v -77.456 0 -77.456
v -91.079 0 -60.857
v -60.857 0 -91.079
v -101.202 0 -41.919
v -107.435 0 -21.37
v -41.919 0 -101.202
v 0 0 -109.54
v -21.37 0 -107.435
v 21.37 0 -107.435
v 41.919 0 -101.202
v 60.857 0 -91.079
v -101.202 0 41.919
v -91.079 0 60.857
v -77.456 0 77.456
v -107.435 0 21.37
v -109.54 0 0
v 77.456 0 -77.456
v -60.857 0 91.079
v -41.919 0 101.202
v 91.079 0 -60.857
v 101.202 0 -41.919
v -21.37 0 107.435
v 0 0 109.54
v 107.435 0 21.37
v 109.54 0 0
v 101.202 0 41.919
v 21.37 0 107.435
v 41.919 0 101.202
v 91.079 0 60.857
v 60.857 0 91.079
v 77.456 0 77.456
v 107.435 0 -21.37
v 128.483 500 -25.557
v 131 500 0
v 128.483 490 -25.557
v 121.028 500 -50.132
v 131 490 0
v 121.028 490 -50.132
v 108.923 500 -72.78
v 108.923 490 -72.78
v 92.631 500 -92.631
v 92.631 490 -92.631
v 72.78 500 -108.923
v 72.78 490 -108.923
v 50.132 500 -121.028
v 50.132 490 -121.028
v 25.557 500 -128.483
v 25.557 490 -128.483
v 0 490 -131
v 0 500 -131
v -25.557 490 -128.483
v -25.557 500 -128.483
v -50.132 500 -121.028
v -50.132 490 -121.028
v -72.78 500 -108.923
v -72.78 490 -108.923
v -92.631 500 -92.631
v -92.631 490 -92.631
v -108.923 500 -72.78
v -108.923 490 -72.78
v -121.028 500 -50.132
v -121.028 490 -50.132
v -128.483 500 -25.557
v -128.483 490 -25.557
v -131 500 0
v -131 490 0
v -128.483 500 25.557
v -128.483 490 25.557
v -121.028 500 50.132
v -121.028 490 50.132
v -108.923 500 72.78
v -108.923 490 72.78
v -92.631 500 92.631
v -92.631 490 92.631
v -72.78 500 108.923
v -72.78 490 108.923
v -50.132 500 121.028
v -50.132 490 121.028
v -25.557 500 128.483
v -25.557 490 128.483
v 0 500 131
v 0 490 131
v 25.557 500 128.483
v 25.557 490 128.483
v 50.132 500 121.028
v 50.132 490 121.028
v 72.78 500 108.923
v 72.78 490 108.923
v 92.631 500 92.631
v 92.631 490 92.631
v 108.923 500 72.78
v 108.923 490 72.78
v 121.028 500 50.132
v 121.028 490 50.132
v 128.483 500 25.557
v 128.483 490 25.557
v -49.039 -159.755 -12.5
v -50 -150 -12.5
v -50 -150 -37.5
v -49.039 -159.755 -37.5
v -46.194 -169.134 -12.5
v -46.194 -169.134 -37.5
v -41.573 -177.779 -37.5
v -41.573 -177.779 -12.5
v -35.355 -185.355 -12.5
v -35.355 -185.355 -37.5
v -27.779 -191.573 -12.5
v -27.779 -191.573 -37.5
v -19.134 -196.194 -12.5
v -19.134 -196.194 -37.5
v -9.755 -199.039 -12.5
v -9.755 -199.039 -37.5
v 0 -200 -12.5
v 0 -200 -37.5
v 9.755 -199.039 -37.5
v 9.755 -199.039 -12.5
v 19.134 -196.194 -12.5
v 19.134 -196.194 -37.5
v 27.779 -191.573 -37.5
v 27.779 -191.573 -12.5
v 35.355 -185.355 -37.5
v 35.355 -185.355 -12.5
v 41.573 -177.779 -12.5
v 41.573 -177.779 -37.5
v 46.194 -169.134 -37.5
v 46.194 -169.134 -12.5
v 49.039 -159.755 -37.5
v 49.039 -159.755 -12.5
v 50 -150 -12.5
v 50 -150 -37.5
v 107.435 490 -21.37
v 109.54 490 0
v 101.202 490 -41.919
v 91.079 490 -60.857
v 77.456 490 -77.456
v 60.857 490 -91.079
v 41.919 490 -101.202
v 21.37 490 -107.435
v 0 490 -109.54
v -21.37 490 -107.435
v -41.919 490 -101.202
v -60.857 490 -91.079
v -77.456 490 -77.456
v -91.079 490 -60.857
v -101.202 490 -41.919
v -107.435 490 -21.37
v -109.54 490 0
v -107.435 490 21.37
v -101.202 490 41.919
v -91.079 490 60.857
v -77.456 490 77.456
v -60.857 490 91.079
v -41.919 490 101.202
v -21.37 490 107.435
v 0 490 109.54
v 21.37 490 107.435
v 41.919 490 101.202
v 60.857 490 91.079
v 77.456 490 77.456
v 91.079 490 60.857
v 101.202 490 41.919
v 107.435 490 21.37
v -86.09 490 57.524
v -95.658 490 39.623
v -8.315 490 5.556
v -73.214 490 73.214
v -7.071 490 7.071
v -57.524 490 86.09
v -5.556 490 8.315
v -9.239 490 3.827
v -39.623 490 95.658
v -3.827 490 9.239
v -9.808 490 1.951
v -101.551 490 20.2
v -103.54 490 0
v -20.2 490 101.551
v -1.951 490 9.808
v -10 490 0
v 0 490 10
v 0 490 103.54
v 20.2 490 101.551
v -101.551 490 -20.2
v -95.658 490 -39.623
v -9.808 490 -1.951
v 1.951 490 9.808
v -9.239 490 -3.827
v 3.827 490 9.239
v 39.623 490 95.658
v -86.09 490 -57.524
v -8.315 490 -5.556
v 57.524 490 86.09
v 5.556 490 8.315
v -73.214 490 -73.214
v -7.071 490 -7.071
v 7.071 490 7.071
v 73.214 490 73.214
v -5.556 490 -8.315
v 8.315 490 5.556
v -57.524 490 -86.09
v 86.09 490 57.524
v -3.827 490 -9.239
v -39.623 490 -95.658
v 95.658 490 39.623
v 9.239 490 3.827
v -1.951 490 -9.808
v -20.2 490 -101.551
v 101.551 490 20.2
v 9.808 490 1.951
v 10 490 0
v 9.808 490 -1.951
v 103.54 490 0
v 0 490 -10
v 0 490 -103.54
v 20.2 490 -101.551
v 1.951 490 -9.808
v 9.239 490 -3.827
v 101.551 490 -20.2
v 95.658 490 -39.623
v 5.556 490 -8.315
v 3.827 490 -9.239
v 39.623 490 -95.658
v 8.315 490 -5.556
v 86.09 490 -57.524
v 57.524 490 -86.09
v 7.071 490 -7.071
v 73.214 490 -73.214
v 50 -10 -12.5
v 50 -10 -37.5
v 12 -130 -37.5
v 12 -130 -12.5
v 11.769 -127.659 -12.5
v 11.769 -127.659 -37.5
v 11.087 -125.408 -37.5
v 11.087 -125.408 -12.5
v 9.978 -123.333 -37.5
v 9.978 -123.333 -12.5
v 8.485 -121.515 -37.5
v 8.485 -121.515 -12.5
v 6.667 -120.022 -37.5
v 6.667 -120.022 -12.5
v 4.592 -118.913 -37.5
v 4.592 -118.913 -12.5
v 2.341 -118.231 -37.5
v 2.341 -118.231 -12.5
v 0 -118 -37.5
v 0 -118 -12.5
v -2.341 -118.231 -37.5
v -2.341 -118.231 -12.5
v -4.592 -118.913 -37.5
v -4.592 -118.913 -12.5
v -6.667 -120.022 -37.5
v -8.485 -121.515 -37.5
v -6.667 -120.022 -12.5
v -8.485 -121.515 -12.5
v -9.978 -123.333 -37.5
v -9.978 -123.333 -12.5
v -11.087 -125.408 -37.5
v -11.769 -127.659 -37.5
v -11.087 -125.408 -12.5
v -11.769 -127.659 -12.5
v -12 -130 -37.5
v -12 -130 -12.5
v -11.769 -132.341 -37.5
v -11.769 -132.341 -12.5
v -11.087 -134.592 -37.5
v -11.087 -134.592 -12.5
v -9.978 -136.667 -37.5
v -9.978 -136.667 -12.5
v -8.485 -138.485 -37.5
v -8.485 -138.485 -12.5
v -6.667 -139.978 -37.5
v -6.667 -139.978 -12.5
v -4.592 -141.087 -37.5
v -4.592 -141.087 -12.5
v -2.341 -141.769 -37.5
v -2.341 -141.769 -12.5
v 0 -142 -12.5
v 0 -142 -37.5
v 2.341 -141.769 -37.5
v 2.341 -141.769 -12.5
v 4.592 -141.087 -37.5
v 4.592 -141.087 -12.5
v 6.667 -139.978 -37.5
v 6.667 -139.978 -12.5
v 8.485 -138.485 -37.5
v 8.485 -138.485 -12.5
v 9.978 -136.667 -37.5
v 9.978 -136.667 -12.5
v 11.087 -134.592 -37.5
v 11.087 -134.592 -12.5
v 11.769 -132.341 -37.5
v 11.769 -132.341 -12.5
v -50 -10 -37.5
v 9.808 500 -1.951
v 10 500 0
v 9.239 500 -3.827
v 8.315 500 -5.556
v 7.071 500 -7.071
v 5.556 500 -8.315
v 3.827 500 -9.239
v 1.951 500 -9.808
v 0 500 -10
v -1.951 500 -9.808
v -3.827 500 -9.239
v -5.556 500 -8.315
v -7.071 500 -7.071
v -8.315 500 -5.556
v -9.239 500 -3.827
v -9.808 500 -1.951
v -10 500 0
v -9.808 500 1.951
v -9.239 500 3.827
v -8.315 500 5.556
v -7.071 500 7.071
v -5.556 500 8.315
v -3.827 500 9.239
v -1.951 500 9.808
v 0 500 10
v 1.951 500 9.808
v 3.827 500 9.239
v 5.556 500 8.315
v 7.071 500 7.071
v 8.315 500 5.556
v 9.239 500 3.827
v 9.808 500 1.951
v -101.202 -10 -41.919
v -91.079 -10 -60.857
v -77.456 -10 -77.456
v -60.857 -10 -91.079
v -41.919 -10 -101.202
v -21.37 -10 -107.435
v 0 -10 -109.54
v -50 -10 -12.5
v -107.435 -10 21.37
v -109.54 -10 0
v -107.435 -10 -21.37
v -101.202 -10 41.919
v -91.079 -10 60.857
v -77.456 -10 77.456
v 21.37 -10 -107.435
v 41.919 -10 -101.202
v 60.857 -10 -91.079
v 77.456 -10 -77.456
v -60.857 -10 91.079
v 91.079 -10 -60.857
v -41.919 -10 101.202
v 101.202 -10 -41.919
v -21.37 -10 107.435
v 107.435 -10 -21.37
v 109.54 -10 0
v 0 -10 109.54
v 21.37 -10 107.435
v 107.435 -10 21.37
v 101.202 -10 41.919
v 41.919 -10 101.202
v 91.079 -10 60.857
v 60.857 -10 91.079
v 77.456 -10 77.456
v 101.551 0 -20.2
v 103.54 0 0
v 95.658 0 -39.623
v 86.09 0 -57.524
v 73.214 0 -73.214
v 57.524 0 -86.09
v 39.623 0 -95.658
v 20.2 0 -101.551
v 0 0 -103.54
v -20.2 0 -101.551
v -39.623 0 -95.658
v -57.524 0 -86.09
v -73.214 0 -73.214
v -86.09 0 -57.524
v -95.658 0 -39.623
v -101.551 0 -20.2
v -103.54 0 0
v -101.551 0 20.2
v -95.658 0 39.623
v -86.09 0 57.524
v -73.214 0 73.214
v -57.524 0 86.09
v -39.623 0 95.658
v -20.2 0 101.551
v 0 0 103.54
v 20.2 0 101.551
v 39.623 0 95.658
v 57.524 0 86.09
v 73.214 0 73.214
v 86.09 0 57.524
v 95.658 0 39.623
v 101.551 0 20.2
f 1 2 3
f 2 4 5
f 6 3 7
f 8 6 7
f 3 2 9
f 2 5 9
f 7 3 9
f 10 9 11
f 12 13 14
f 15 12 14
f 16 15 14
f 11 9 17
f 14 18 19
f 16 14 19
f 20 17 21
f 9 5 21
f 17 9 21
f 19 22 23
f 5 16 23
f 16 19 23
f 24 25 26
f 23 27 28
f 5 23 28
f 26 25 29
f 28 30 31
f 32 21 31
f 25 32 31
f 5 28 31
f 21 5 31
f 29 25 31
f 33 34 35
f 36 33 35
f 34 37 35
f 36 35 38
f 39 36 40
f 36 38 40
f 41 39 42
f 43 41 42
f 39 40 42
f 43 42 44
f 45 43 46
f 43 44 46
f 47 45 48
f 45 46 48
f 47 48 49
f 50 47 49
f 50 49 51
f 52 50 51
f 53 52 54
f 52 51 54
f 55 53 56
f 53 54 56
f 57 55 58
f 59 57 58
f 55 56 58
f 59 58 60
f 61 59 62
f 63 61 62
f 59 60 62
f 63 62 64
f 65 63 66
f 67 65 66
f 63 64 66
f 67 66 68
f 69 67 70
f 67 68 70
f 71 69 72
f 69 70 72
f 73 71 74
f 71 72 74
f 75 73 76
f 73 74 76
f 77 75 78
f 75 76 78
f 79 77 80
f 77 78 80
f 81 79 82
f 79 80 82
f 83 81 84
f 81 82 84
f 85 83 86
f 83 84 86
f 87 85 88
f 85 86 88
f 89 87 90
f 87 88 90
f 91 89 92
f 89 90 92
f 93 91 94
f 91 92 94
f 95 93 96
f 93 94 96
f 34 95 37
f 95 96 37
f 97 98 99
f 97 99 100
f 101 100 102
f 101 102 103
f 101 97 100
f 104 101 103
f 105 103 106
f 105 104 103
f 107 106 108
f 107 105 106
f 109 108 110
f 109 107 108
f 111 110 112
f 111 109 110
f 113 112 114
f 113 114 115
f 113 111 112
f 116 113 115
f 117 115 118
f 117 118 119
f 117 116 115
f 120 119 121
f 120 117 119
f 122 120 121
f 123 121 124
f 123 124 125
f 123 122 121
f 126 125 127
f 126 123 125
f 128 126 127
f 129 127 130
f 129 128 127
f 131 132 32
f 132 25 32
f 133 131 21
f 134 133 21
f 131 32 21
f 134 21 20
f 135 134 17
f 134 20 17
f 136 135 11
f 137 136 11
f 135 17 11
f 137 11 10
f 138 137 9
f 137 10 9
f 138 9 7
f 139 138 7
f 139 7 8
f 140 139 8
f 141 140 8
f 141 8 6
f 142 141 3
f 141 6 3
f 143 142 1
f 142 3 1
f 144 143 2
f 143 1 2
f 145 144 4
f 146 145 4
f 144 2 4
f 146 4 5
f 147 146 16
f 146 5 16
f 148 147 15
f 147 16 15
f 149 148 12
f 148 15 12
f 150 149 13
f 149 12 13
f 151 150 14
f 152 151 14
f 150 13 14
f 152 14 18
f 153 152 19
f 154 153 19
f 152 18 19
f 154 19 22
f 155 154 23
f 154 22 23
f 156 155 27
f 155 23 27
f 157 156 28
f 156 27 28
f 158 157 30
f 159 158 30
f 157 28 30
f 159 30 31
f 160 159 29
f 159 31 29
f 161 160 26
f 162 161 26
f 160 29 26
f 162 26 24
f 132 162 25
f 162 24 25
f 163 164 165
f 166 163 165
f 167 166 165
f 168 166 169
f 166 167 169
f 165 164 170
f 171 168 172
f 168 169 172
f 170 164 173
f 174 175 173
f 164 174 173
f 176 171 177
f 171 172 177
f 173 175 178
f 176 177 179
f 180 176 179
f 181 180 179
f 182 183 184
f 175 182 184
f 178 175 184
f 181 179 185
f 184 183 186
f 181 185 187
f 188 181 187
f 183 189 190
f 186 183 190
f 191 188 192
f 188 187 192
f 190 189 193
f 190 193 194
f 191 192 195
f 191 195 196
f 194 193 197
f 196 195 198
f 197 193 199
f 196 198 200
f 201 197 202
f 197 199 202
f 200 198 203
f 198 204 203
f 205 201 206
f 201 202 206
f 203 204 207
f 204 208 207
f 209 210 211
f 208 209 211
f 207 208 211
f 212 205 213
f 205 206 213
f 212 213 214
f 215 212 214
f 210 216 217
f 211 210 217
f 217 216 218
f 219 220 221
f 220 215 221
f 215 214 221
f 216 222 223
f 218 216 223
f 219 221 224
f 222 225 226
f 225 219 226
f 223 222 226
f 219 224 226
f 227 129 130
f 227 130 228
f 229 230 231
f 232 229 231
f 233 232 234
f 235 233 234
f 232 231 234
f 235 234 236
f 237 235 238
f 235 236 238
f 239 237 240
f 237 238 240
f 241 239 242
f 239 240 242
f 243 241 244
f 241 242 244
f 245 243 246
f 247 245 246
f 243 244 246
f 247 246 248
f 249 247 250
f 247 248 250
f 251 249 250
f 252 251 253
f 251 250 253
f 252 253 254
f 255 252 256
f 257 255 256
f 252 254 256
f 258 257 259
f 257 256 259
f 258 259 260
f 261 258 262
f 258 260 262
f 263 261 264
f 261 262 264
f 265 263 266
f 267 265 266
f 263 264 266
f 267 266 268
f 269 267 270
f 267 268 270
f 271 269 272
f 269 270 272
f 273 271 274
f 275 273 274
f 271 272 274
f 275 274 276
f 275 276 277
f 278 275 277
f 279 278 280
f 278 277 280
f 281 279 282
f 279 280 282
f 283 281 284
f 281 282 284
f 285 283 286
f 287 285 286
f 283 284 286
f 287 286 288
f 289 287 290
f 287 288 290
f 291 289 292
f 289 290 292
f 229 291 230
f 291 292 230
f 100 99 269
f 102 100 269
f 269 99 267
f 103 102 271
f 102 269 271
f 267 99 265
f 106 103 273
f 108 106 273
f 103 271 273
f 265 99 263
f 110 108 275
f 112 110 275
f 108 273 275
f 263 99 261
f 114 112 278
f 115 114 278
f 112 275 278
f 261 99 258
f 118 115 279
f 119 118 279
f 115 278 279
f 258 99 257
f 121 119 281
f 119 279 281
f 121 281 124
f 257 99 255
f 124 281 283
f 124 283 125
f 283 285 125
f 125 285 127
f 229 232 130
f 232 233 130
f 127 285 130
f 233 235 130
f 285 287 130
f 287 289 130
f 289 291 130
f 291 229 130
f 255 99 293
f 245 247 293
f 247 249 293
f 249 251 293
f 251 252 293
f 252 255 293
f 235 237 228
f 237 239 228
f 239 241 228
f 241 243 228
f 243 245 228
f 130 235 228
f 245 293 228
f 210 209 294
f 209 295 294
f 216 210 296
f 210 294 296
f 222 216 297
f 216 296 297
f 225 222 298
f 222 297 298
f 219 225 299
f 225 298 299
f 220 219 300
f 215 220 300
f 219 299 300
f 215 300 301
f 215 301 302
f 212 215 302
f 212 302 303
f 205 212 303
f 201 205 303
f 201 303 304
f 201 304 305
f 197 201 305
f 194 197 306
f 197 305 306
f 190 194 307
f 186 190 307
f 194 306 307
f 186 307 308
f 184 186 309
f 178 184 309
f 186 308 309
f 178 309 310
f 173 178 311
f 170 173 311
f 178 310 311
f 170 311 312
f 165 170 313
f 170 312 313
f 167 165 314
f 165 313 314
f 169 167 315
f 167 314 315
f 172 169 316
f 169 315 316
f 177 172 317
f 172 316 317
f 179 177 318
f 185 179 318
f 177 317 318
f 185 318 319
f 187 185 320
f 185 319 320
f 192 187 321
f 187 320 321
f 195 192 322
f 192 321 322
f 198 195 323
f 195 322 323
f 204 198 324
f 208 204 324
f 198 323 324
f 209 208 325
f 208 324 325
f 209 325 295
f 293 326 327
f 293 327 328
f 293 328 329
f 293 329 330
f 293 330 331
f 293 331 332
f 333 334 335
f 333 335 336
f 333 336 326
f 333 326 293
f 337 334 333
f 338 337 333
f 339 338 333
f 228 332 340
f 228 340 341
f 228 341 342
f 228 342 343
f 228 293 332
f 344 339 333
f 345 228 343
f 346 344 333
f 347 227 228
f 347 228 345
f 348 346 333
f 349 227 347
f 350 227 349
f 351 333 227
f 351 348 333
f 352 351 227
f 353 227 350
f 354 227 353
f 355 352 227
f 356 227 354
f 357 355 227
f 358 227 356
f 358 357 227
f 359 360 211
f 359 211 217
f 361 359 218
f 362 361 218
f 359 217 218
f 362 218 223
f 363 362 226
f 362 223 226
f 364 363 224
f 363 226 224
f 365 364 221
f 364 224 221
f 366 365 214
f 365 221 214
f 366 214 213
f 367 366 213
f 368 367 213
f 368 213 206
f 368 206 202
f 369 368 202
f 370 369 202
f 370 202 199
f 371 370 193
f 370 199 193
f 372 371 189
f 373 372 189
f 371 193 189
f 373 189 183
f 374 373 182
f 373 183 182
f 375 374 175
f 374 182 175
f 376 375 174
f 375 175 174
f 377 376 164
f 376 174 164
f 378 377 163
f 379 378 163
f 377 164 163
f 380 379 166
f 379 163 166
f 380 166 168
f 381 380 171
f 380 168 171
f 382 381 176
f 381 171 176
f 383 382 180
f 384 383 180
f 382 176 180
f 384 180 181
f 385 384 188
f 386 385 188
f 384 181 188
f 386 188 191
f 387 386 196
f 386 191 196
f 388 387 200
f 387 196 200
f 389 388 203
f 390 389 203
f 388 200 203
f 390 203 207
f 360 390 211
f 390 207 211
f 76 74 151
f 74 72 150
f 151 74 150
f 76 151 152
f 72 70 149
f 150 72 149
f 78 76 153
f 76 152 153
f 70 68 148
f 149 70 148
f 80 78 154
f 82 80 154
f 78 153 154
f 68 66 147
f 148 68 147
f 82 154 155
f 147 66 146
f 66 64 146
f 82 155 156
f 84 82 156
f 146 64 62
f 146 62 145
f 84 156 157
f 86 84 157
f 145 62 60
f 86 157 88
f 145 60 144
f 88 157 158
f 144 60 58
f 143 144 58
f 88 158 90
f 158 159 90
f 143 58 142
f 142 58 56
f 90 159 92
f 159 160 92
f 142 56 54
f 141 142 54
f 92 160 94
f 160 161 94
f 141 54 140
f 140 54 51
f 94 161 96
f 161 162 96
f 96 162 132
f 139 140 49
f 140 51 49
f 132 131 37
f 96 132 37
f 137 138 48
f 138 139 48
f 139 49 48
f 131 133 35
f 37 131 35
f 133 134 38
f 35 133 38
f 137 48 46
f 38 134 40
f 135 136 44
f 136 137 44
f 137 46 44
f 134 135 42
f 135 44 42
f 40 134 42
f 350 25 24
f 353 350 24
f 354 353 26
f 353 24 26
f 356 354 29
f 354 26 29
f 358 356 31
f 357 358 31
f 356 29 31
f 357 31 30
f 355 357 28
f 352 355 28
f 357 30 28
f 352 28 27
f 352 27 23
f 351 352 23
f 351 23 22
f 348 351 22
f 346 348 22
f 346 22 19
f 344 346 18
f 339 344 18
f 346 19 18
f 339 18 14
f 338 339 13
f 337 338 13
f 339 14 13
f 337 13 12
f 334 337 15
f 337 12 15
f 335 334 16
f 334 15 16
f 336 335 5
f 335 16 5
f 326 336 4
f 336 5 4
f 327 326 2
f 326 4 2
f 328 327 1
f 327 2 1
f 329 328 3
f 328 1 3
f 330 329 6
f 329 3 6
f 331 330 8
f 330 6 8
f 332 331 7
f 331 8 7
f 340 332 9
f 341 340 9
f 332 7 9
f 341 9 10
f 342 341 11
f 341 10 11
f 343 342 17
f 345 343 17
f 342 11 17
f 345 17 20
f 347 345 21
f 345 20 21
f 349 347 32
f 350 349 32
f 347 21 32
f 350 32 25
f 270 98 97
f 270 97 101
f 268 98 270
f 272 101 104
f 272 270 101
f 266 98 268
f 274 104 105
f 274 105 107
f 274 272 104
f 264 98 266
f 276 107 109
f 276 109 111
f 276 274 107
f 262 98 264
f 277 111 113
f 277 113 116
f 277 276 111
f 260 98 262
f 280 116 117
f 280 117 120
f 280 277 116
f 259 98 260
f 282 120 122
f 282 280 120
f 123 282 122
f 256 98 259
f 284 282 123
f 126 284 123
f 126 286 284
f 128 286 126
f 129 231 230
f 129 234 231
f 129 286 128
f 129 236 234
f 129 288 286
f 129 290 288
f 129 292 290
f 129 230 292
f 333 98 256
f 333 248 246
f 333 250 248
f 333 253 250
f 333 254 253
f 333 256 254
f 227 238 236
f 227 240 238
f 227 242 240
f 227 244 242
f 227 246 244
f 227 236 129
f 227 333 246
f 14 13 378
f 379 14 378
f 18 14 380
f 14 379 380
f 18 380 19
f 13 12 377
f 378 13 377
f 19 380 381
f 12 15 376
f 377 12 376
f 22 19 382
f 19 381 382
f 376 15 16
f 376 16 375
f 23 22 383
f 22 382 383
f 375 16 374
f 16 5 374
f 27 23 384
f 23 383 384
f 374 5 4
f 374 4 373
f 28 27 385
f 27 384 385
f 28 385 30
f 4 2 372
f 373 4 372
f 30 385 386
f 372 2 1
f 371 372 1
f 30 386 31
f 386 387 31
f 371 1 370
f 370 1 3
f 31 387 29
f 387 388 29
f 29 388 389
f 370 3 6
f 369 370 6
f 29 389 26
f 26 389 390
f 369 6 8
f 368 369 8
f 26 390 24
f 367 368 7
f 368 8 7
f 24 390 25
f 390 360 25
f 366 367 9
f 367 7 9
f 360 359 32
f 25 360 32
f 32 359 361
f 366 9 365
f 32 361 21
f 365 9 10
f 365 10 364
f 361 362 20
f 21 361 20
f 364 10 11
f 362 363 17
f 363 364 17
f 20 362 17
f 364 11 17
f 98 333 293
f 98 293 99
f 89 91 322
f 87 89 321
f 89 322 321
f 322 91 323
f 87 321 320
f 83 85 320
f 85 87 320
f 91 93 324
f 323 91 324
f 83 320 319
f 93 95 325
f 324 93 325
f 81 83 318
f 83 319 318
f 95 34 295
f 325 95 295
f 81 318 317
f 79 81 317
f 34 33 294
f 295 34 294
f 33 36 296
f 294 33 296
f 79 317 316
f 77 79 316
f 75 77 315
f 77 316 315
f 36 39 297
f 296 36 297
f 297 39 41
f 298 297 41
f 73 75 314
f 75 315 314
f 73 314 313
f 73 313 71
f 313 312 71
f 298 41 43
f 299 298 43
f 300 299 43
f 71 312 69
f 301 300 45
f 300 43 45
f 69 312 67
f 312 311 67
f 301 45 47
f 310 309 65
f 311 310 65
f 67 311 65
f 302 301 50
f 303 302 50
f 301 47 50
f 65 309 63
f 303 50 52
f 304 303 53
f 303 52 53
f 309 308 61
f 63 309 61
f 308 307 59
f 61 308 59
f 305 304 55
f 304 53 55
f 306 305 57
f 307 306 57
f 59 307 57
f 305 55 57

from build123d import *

# Parameters (mm, degrees)
ESBO_O3_R                = 109.54
RESSALTO_EXTRUS_O1_DEPTH = 10
RESSALTO_EXTRUS_O2_START = -12.5
ESBO_O4_R                = 12
RESSALTO_EXTRUS_O2_DEPTH = 25


with BuildPart() as part:
    # Esboço1 → Revolução1 (revolve)
    with BuildSketch(Plane.XY):
        Polygon((10, 500), (131, 500), (131, 490), (109.54, 490), (109.54, 0), (103.54, 0), (103.54, 490), (10, 490), align=None)
    revolve(axis=Axis((0, 0, 0), (0, 1, 0)))


with BuildPart() as body_2:
    # Esboço3 → Ressalto-extrusão1 (new body)
    with BuildSketch(Plane.XZ):
        Circle(ESBO_O3_R)
    extrude(amount=RESSALTO_EXTRUS_O1_DEPTH)

    # Esboço4 → Ressalto-extrusão2 (add)
    with BuildSketch(Plane.XY.offset(RESSALTO_EXTRUS_O2_START)):
        with BuildLine():
            Line((-50, -10), (-50, -150))
            ThreePointArc((-50, -150), (0, -200), (50, -150))
            Line((50, -150), (50, -10))
            Line((50, -10), (-50, -10))
        make_face()
        with Locations((0, -130)):
            Circle(ESBO_O4_R, mode=Mode.SUBTRACT)
    extrude(amount=-RESSALTO_EXTRUS_O2_DEPTH)


solid = Compound([part.part, body_2.part])
